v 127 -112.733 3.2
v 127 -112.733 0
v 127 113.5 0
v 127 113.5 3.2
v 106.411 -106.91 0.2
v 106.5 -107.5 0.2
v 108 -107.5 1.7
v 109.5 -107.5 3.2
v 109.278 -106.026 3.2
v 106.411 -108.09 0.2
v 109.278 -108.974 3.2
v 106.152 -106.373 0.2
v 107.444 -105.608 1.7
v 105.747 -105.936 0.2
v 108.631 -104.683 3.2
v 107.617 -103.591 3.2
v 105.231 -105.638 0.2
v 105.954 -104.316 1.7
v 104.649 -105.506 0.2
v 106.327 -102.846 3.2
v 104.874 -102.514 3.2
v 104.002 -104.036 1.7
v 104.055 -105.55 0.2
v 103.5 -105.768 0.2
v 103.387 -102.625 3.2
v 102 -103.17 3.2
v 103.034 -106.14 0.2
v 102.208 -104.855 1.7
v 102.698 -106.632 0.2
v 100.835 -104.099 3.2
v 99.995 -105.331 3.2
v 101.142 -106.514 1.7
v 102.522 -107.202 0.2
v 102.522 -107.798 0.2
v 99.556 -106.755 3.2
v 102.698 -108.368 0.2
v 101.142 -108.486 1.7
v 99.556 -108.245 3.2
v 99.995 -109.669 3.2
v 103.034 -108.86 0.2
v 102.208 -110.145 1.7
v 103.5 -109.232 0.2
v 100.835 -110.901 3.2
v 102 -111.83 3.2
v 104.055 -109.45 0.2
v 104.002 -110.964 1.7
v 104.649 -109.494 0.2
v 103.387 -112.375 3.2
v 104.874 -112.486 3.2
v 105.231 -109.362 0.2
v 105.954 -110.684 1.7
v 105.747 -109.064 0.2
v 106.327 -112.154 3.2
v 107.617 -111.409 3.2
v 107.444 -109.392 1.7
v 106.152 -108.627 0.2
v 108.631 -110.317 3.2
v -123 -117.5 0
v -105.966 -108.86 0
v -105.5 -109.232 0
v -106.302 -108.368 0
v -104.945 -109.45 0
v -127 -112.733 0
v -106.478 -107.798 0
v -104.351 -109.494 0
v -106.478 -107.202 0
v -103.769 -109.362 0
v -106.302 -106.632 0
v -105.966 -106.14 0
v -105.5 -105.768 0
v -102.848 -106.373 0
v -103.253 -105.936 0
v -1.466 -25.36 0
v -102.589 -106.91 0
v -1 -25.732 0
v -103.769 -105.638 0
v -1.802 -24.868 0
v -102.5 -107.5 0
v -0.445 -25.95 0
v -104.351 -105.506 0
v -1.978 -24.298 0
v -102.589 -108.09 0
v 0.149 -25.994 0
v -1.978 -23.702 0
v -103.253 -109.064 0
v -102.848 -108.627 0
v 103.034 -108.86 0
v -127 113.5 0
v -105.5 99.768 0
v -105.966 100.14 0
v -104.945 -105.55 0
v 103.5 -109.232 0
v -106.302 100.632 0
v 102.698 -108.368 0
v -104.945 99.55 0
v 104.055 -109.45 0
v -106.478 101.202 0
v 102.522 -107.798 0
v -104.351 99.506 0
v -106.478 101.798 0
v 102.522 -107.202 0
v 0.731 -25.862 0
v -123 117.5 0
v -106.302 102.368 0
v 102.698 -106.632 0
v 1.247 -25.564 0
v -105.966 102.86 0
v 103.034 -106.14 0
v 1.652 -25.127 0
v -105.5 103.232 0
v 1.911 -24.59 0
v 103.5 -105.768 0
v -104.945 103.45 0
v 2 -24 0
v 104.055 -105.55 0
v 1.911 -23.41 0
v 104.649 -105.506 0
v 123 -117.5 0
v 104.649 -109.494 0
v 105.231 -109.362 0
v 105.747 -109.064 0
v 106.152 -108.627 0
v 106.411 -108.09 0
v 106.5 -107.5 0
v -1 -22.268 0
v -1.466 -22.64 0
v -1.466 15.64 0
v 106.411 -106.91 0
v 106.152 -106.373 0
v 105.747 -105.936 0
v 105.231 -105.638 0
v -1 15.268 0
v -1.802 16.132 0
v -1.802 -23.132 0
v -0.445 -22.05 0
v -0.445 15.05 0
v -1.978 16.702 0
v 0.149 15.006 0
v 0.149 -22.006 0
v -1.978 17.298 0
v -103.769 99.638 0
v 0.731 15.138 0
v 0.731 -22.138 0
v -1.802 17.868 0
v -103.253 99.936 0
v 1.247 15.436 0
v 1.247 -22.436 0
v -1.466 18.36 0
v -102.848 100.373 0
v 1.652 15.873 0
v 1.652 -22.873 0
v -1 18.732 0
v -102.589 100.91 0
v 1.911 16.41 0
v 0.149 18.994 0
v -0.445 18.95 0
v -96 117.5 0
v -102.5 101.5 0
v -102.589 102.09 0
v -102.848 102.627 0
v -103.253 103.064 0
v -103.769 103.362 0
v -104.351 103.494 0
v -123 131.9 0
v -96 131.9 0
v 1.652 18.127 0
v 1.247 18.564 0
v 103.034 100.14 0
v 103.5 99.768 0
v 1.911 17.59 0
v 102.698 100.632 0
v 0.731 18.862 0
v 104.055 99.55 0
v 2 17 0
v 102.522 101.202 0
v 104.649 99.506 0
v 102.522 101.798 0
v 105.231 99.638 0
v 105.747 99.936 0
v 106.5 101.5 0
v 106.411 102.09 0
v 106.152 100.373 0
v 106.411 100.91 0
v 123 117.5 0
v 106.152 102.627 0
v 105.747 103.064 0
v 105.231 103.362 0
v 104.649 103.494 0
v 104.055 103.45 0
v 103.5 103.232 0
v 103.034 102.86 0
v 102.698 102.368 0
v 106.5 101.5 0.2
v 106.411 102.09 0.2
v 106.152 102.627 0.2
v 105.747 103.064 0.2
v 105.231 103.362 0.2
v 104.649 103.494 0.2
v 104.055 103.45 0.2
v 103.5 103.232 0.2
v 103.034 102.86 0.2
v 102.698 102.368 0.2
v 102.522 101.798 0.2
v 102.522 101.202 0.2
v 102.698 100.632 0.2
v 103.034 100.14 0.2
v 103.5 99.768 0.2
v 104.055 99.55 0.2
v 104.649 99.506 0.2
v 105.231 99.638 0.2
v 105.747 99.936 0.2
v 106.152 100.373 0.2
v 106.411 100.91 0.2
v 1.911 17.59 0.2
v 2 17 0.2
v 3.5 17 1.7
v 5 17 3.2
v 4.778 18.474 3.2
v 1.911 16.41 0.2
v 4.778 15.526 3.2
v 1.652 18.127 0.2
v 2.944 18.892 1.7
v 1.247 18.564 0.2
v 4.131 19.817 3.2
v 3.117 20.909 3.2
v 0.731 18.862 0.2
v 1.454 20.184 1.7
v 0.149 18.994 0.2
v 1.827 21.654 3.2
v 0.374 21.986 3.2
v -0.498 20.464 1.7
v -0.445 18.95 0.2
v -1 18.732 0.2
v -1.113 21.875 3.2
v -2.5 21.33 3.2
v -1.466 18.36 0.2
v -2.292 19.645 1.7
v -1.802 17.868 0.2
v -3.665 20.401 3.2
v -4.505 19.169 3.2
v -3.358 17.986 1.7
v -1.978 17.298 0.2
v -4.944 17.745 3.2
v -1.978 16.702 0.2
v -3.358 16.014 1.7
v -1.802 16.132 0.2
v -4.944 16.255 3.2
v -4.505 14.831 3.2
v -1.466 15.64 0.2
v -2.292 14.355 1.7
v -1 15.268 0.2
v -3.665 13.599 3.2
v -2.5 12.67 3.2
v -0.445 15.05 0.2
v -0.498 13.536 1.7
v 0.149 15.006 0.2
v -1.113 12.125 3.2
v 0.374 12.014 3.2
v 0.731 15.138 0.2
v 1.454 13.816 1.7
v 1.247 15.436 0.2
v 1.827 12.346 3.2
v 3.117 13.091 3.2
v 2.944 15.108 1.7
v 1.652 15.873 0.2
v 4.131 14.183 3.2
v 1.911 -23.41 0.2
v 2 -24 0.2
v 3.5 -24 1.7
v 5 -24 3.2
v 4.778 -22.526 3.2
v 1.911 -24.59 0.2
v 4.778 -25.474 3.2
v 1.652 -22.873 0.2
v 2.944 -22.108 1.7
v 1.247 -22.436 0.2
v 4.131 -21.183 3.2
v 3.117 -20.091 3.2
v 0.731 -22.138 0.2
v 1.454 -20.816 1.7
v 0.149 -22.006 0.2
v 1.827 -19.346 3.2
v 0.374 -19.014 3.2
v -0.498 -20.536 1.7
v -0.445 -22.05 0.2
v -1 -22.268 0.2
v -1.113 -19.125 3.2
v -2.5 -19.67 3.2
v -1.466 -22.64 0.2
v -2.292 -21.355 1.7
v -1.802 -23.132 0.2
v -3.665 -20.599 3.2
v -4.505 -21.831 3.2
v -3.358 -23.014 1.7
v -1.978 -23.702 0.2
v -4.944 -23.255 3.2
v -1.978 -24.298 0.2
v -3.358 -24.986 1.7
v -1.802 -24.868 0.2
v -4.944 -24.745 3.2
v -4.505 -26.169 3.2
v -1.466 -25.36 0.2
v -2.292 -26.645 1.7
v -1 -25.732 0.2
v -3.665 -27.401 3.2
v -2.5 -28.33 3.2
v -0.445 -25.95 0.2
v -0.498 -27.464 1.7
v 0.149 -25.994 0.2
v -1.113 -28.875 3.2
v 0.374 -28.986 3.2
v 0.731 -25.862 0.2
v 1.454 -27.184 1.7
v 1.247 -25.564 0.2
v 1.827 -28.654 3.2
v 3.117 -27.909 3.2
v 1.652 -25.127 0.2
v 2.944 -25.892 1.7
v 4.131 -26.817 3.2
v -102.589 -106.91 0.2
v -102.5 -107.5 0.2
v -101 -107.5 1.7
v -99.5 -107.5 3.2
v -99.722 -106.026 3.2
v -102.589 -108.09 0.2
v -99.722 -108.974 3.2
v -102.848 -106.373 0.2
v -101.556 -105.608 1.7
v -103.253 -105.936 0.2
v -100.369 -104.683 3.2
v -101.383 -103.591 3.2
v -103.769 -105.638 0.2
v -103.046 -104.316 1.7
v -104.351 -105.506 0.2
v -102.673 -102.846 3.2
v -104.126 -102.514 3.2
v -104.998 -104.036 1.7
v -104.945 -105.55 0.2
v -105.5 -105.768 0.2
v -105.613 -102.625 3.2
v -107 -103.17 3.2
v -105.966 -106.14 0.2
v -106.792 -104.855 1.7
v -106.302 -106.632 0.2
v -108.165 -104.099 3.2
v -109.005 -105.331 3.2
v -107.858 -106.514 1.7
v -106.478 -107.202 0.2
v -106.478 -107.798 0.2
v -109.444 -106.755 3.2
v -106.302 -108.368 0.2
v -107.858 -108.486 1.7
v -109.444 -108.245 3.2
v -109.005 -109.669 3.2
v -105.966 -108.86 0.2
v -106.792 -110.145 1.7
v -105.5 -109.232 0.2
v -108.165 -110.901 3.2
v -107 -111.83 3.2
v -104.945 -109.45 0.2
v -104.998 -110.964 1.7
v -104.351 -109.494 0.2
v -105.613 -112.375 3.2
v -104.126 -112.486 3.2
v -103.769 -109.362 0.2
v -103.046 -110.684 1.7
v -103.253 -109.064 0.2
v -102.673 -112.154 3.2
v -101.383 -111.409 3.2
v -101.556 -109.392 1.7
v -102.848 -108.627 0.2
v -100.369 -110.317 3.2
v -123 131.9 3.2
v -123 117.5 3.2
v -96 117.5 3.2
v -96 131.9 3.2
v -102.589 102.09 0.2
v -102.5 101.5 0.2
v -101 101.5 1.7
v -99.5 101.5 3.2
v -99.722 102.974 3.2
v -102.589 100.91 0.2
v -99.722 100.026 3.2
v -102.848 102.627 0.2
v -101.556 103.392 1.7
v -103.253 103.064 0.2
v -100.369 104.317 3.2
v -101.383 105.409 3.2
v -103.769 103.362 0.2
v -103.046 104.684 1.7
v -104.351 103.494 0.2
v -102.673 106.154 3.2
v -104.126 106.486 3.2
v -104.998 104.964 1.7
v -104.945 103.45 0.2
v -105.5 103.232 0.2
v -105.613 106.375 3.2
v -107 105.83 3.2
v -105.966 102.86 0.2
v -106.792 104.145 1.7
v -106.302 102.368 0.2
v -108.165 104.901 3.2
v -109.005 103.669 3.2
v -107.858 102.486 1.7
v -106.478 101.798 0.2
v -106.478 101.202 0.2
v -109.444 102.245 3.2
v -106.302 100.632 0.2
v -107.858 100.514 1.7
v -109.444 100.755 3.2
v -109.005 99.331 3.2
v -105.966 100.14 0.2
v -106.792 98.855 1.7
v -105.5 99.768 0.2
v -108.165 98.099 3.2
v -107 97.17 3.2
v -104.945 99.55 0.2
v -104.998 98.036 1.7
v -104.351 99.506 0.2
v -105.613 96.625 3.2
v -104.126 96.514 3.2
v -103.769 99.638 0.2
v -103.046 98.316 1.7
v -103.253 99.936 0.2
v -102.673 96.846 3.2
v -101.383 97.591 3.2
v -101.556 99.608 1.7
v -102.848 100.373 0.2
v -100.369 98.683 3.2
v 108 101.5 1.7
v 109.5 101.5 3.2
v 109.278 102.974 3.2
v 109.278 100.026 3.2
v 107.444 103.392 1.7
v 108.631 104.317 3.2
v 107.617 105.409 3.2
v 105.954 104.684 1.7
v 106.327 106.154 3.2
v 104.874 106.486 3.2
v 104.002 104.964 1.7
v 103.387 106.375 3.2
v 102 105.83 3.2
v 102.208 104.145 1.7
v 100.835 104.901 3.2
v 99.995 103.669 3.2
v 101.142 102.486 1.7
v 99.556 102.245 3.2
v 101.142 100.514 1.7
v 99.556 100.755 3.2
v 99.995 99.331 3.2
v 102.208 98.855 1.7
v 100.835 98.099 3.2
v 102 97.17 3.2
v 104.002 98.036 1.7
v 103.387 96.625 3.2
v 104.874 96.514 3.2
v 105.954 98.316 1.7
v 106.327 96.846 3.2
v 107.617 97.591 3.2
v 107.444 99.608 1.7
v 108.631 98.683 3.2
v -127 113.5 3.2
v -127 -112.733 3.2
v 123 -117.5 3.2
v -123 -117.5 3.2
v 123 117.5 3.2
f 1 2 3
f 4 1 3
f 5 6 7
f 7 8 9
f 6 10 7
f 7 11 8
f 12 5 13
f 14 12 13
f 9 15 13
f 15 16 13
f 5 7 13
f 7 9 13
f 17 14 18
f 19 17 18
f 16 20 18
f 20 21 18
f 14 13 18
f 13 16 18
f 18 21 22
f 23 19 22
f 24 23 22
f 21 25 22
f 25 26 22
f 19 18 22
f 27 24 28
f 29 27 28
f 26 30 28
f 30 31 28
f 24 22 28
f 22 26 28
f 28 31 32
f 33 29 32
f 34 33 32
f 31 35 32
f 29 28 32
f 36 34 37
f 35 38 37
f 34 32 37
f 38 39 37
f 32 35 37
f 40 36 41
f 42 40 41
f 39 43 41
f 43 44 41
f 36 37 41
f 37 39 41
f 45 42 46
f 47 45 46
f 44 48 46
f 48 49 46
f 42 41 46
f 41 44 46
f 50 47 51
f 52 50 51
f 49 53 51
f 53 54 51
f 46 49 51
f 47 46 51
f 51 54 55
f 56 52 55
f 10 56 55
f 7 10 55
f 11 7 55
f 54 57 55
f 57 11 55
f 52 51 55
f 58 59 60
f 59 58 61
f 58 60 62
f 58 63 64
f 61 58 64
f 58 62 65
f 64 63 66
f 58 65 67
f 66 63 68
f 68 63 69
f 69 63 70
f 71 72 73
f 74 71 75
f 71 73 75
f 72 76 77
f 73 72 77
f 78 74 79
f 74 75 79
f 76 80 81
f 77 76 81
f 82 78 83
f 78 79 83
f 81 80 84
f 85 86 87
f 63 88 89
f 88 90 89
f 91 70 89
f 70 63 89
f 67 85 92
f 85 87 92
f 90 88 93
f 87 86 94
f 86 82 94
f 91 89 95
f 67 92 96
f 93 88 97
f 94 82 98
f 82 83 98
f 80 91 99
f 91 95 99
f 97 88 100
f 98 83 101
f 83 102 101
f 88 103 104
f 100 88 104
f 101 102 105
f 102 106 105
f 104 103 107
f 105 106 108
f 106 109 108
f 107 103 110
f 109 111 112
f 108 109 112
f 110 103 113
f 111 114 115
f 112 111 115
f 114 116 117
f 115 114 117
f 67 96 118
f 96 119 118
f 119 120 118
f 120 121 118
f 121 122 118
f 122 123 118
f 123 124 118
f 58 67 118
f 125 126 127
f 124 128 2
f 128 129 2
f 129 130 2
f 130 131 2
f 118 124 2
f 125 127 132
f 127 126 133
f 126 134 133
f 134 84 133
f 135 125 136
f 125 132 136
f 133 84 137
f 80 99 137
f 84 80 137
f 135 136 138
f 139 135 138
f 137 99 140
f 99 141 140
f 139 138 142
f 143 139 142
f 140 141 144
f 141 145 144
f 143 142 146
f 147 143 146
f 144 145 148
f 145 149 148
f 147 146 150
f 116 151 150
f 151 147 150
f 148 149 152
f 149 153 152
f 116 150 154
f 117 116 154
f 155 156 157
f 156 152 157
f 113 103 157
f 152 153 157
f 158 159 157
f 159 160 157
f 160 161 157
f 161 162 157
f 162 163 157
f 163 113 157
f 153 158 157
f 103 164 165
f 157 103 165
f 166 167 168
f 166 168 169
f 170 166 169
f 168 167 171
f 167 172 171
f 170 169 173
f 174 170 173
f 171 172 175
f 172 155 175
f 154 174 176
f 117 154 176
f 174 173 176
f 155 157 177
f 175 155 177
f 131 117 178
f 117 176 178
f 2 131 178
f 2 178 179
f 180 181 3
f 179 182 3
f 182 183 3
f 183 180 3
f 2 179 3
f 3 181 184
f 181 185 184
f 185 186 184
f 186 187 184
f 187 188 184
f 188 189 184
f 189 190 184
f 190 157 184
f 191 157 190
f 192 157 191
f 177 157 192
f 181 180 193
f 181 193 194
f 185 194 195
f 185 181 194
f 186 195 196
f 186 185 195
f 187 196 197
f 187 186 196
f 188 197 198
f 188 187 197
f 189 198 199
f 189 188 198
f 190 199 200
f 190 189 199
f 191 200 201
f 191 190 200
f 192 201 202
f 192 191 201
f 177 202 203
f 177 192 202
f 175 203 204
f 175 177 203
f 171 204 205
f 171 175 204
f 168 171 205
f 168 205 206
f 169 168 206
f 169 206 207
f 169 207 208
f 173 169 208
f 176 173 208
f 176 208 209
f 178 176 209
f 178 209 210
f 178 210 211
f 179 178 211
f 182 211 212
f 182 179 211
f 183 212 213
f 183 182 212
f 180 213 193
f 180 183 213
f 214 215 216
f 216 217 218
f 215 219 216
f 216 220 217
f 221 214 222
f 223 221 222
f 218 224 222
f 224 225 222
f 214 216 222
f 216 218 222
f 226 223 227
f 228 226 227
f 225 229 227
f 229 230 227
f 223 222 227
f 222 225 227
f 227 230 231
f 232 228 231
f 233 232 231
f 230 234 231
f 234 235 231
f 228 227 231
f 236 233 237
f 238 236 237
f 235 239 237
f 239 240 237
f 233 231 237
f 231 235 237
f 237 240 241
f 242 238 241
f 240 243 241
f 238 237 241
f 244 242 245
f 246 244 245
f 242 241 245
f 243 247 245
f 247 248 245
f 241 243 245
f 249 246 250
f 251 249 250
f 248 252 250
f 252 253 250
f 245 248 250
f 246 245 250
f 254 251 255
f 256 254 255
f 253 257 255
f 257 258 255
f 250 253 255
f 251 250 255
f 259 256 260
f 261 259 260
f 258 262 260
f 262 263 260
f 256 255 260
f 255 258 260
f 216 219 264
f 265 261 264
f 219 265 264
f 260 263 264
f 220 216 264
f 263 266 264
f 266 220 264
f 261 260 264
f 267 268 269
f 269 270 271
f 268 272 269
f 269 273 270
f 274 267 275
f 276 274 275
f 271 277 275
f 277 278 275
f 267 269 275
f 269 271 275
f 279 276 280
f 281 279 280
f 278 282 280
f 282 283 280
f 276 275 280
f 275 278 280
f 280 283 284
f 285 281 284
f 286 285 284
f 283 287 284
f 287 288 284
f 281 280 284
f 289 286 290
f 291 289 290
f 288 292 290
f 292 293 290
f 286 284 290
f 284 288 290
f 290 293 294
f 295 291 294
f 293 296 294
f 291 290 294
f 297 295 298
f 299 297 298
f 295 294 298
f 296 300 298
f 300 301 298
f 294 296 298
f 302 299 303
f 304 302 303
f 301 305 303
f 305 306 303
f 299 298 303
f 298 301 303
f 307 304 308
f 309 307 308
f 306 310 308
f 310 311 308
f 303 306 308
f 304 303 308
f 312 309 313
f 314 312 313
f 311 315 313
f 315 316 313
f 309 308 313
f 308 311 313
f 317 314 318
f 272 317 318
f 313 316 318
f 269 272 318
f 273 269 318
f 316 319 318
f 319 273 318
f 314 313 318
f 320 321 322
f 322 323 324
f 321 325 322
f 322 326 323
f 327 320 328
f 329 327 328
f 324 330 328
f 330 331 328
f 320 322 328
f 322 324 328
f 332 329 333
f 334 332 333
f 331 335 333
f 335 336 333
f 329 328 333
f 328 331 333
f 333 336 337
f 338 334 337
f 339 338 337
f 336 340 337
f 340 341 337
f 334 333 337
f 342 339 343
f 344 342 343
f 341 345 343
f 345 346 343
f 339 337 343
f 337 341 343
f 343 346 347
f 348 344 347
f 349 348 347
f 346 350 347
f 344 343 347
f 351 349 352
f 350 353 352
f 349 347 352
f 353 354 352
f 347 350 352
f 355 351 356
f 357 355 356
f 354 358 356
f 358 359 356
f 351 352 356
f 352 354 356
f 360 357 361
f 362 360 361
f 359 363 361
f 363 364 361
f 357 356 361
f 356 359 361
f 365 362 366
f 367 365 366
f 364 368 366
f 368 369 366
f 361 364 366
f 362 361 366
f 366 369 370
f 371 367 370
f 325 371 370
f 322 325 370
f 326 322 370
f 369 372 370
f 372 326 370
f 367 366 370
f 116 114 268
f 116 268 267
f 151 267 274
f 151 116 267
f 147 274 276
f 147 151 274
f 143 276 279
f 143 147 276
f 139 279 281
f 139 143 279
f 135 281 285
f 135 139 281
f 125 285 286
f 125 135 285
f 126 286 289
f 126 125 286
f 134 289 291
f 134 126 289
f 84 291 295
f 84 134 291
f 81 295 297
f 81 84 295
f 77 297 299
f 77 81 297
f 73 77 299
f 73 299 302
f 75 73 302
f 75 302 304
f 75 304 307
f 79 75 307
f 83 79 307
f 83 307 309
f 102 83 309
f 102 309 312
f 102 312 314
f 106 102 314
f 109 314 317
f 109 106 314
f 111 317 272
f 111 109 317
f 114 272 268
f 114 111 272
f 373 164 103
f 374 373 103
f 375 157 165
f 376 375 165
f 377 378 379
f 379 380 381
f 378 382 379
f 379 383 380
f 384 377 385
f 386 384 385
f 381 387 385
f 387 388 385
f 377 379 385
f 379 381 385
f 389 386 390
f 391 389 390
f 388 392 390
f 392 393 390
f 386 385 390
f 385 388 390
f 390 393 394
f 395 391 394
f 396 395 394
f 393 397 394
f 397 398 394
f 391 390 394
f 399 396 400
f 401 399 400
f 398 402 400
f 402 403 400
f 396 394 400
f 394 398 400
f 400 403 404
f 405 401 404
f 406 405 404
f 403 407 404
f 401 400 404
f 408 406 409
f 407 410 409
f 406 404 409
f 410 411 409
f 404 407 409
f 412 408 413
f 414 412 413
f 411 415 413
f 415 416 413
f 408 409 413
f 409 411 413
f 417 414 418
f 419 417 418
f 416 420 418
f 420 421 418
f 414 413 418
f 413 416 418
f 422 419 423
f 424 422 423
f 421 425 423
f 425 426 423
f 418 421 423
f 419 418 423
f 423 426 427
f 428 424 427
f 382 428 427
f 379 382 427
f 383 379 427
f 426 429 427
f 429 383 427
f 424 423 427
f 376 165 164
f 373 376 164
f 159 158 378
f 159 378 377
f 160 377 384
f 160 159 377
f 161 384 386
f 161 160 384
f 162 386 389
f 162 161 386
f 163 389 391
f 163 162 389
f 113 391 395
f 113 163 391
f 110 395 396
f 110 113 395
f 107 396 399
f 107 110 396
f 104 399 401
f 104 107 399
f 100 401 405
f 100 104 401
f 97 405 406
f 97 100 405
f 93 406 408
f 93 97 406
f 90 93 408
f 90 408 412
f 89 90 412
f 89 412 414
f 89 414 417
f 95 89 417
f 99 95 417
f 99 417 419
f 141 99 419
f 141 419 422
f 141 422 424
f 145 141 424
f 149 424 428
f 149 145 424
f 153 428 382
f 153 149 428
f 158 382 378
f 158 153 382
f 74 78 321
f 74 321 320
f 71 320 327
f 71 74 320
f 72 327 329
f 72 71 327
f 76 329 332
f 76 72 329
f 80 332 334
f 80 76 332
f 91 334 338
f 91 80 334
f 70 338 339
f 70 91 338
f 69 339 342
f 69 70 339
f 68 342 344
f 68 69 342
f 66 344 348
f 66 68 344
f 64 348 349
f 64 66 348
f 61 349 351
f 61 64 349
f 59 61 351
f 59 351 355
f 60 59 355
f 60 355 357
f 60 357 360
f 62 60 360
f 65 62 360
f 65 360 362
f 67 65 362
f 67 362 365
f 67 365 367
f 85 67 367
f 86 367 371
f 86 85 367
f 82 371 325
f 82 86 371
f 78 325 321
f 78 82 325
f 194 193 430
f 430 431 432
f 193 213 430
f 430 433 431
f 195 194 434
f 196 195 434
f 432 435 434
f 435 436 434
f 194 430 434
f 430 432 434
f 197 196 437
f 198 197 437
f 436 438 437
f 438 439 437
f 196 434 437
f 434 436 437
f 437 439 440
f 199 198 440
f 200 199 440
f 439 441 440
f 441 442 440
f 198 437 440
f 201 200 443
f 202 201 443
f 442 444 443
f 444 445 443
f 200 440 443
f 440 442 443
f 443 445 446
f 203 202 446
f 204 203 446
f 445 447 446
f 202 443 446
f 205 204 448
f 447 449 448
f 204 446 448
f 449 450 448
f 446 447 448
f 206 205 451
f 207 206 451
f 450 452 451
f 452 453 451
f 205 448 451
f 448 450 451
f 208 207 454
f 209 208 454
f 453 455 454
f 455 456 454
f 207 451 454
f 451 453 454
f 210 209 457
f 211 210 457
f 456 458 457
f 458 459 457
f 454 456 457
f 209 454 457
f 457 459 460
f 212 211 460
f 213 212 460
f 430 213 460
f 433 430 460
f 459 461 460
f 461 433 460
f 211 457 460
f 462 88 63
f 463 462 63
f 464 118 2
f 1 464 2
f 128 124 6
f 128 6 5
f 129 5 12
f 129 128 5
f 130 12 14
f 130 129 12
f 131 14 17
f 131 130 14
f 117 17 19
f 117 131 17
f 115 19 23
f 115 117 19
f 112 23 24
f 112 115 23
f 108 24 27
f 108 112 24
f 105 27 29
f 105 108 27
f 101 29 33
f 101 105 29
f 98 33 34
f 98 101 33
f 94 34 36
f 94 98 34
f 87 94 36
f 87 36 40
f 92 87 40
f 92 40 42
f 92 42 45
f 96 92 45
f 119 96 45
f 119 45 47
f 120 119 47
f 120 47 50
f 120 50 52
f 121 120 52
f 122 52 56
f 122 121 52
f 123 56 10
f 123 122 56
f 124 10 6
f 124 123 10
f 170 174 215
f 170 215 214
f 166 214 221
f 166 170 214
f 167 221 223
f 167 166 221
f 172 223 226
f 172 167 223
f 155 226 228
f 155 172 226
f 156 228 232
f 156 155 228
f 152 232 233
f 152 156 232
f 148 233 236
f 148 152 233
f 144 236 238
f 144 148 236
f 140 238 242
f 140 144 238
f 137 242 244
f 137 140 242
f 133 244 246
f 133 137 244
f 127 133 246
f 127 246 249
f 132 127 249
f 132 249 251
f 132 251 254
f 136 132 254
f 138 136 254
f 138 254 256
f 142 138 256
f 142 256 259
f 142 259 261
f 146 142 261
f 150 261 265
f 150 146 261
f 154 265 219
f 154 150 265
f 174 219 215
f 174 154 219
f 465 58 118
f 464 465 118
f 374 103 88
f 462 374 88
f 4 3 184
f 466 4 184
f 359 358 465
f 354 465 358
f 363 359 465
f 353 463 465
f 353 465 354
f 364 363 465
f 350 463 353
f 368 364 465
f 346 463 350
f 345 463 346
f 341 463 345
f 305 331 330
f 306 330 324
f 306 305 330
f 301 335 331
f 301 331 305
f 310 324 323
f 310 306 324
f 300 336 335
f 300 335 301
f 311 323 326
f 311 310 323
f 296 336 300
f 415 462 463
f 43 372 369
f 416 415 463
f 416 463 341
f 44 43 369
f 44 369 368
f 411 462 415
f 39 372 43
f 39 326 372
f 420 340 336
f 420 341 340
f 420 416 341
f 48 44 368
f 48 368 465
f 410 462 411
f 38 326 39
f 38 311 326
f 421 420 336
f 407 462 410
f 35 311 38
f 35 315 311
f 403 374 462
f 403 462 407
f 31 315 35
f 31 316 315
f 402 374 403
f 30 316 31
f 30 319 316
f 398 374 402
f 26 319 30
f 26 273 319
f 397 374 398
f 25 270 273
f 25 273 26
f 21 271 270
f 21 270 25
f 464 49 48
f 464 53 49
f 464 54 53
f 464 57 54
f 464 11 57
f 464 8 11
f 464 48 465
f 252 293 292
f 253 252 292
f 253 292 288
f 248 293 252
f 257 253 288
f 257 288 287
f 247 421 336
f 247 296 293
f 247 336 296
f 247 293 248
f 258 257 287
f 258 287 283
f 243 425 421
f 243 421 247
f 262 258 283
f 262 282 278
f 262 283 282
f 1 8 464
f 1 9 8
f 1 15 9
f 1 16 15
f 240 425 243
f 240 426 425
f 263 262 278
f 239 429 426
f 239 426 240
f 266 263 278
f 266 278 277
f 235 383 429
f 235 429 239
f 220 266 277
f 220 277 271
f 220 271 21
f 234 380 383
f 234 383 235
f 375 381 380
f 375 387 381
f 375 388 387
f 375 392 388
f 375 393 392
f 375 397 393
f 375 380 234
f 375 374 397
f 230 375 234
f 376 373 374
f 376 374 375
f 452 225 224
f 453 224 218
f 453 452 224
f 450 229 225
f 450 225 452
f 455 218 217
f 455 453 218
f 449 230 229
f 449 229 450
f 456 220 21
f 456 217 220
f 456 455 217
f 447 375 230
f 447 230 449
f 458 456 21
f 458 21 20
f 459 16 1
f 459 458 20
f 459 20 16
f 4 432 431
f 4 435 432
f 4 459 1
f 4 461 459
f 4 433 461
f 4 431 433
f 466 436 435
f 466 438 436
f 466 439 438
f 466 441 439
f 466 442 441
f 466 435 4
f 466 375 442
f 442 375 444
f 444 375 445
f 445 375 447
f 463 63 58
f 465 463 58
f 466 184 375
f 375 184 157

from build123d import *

# Parameters (mm, degrees)
F0_R     = 2
F1_DEPTH = 3.2
F2_SIZE  = 3


with BuildPart() as f1:
    # F0 (on Top) → F1 (new body)
    with BuildSketch(Plane.XY):
        Polygon((-96, 131.9), (-123, 131.9), (-123, 117.5), (-127, 113.5), (-127, -112.732986), (-123, -117.5), (123, -117.5), (127, -112.732986), (127, 113.5), (123, 117.5), (-96, 117.5), align=None)
        with Locations((-104.5, -107.5)):
            Circle(F0_R, mode=Mode.SUBTRACT)
        with Locations((104.5, -107.5)):
            Circle(F0_R, mode=Mode.SUBTRACT)
        with Locations((0, -24)):
            Circle(F0_R, mode=Mode.SUBTRACT)
        with Locations((-104.5, 101.5)):
            Circle(F0_R, mode=Mode.SUBTRACT)
        with Locations((0, 17)):
            Circle(F0_R, mode=Mode.SUBTRACT)
        with Locations((104.5, 101.5)):
            Circle(F0_R, mode=Mode.SUBTRACT)
    extrude(amount=F1_DEPTH)

    # F2
    f2_edges = [f1.edges().sort_by_distance(p)[0] for p in [
        (-106.5, 101.5, 3.2),
        (-2, 17, 3.2),
        (-2, -24, 3.2),
        (102.5, 101.5, 3.2),
        (102.5, -107.5, 3.2),
        (-106.5, -107.5, 3.2),
    ]]
    chamfer(f2_edges, length=F2_SIZE)


solid = f1.part
